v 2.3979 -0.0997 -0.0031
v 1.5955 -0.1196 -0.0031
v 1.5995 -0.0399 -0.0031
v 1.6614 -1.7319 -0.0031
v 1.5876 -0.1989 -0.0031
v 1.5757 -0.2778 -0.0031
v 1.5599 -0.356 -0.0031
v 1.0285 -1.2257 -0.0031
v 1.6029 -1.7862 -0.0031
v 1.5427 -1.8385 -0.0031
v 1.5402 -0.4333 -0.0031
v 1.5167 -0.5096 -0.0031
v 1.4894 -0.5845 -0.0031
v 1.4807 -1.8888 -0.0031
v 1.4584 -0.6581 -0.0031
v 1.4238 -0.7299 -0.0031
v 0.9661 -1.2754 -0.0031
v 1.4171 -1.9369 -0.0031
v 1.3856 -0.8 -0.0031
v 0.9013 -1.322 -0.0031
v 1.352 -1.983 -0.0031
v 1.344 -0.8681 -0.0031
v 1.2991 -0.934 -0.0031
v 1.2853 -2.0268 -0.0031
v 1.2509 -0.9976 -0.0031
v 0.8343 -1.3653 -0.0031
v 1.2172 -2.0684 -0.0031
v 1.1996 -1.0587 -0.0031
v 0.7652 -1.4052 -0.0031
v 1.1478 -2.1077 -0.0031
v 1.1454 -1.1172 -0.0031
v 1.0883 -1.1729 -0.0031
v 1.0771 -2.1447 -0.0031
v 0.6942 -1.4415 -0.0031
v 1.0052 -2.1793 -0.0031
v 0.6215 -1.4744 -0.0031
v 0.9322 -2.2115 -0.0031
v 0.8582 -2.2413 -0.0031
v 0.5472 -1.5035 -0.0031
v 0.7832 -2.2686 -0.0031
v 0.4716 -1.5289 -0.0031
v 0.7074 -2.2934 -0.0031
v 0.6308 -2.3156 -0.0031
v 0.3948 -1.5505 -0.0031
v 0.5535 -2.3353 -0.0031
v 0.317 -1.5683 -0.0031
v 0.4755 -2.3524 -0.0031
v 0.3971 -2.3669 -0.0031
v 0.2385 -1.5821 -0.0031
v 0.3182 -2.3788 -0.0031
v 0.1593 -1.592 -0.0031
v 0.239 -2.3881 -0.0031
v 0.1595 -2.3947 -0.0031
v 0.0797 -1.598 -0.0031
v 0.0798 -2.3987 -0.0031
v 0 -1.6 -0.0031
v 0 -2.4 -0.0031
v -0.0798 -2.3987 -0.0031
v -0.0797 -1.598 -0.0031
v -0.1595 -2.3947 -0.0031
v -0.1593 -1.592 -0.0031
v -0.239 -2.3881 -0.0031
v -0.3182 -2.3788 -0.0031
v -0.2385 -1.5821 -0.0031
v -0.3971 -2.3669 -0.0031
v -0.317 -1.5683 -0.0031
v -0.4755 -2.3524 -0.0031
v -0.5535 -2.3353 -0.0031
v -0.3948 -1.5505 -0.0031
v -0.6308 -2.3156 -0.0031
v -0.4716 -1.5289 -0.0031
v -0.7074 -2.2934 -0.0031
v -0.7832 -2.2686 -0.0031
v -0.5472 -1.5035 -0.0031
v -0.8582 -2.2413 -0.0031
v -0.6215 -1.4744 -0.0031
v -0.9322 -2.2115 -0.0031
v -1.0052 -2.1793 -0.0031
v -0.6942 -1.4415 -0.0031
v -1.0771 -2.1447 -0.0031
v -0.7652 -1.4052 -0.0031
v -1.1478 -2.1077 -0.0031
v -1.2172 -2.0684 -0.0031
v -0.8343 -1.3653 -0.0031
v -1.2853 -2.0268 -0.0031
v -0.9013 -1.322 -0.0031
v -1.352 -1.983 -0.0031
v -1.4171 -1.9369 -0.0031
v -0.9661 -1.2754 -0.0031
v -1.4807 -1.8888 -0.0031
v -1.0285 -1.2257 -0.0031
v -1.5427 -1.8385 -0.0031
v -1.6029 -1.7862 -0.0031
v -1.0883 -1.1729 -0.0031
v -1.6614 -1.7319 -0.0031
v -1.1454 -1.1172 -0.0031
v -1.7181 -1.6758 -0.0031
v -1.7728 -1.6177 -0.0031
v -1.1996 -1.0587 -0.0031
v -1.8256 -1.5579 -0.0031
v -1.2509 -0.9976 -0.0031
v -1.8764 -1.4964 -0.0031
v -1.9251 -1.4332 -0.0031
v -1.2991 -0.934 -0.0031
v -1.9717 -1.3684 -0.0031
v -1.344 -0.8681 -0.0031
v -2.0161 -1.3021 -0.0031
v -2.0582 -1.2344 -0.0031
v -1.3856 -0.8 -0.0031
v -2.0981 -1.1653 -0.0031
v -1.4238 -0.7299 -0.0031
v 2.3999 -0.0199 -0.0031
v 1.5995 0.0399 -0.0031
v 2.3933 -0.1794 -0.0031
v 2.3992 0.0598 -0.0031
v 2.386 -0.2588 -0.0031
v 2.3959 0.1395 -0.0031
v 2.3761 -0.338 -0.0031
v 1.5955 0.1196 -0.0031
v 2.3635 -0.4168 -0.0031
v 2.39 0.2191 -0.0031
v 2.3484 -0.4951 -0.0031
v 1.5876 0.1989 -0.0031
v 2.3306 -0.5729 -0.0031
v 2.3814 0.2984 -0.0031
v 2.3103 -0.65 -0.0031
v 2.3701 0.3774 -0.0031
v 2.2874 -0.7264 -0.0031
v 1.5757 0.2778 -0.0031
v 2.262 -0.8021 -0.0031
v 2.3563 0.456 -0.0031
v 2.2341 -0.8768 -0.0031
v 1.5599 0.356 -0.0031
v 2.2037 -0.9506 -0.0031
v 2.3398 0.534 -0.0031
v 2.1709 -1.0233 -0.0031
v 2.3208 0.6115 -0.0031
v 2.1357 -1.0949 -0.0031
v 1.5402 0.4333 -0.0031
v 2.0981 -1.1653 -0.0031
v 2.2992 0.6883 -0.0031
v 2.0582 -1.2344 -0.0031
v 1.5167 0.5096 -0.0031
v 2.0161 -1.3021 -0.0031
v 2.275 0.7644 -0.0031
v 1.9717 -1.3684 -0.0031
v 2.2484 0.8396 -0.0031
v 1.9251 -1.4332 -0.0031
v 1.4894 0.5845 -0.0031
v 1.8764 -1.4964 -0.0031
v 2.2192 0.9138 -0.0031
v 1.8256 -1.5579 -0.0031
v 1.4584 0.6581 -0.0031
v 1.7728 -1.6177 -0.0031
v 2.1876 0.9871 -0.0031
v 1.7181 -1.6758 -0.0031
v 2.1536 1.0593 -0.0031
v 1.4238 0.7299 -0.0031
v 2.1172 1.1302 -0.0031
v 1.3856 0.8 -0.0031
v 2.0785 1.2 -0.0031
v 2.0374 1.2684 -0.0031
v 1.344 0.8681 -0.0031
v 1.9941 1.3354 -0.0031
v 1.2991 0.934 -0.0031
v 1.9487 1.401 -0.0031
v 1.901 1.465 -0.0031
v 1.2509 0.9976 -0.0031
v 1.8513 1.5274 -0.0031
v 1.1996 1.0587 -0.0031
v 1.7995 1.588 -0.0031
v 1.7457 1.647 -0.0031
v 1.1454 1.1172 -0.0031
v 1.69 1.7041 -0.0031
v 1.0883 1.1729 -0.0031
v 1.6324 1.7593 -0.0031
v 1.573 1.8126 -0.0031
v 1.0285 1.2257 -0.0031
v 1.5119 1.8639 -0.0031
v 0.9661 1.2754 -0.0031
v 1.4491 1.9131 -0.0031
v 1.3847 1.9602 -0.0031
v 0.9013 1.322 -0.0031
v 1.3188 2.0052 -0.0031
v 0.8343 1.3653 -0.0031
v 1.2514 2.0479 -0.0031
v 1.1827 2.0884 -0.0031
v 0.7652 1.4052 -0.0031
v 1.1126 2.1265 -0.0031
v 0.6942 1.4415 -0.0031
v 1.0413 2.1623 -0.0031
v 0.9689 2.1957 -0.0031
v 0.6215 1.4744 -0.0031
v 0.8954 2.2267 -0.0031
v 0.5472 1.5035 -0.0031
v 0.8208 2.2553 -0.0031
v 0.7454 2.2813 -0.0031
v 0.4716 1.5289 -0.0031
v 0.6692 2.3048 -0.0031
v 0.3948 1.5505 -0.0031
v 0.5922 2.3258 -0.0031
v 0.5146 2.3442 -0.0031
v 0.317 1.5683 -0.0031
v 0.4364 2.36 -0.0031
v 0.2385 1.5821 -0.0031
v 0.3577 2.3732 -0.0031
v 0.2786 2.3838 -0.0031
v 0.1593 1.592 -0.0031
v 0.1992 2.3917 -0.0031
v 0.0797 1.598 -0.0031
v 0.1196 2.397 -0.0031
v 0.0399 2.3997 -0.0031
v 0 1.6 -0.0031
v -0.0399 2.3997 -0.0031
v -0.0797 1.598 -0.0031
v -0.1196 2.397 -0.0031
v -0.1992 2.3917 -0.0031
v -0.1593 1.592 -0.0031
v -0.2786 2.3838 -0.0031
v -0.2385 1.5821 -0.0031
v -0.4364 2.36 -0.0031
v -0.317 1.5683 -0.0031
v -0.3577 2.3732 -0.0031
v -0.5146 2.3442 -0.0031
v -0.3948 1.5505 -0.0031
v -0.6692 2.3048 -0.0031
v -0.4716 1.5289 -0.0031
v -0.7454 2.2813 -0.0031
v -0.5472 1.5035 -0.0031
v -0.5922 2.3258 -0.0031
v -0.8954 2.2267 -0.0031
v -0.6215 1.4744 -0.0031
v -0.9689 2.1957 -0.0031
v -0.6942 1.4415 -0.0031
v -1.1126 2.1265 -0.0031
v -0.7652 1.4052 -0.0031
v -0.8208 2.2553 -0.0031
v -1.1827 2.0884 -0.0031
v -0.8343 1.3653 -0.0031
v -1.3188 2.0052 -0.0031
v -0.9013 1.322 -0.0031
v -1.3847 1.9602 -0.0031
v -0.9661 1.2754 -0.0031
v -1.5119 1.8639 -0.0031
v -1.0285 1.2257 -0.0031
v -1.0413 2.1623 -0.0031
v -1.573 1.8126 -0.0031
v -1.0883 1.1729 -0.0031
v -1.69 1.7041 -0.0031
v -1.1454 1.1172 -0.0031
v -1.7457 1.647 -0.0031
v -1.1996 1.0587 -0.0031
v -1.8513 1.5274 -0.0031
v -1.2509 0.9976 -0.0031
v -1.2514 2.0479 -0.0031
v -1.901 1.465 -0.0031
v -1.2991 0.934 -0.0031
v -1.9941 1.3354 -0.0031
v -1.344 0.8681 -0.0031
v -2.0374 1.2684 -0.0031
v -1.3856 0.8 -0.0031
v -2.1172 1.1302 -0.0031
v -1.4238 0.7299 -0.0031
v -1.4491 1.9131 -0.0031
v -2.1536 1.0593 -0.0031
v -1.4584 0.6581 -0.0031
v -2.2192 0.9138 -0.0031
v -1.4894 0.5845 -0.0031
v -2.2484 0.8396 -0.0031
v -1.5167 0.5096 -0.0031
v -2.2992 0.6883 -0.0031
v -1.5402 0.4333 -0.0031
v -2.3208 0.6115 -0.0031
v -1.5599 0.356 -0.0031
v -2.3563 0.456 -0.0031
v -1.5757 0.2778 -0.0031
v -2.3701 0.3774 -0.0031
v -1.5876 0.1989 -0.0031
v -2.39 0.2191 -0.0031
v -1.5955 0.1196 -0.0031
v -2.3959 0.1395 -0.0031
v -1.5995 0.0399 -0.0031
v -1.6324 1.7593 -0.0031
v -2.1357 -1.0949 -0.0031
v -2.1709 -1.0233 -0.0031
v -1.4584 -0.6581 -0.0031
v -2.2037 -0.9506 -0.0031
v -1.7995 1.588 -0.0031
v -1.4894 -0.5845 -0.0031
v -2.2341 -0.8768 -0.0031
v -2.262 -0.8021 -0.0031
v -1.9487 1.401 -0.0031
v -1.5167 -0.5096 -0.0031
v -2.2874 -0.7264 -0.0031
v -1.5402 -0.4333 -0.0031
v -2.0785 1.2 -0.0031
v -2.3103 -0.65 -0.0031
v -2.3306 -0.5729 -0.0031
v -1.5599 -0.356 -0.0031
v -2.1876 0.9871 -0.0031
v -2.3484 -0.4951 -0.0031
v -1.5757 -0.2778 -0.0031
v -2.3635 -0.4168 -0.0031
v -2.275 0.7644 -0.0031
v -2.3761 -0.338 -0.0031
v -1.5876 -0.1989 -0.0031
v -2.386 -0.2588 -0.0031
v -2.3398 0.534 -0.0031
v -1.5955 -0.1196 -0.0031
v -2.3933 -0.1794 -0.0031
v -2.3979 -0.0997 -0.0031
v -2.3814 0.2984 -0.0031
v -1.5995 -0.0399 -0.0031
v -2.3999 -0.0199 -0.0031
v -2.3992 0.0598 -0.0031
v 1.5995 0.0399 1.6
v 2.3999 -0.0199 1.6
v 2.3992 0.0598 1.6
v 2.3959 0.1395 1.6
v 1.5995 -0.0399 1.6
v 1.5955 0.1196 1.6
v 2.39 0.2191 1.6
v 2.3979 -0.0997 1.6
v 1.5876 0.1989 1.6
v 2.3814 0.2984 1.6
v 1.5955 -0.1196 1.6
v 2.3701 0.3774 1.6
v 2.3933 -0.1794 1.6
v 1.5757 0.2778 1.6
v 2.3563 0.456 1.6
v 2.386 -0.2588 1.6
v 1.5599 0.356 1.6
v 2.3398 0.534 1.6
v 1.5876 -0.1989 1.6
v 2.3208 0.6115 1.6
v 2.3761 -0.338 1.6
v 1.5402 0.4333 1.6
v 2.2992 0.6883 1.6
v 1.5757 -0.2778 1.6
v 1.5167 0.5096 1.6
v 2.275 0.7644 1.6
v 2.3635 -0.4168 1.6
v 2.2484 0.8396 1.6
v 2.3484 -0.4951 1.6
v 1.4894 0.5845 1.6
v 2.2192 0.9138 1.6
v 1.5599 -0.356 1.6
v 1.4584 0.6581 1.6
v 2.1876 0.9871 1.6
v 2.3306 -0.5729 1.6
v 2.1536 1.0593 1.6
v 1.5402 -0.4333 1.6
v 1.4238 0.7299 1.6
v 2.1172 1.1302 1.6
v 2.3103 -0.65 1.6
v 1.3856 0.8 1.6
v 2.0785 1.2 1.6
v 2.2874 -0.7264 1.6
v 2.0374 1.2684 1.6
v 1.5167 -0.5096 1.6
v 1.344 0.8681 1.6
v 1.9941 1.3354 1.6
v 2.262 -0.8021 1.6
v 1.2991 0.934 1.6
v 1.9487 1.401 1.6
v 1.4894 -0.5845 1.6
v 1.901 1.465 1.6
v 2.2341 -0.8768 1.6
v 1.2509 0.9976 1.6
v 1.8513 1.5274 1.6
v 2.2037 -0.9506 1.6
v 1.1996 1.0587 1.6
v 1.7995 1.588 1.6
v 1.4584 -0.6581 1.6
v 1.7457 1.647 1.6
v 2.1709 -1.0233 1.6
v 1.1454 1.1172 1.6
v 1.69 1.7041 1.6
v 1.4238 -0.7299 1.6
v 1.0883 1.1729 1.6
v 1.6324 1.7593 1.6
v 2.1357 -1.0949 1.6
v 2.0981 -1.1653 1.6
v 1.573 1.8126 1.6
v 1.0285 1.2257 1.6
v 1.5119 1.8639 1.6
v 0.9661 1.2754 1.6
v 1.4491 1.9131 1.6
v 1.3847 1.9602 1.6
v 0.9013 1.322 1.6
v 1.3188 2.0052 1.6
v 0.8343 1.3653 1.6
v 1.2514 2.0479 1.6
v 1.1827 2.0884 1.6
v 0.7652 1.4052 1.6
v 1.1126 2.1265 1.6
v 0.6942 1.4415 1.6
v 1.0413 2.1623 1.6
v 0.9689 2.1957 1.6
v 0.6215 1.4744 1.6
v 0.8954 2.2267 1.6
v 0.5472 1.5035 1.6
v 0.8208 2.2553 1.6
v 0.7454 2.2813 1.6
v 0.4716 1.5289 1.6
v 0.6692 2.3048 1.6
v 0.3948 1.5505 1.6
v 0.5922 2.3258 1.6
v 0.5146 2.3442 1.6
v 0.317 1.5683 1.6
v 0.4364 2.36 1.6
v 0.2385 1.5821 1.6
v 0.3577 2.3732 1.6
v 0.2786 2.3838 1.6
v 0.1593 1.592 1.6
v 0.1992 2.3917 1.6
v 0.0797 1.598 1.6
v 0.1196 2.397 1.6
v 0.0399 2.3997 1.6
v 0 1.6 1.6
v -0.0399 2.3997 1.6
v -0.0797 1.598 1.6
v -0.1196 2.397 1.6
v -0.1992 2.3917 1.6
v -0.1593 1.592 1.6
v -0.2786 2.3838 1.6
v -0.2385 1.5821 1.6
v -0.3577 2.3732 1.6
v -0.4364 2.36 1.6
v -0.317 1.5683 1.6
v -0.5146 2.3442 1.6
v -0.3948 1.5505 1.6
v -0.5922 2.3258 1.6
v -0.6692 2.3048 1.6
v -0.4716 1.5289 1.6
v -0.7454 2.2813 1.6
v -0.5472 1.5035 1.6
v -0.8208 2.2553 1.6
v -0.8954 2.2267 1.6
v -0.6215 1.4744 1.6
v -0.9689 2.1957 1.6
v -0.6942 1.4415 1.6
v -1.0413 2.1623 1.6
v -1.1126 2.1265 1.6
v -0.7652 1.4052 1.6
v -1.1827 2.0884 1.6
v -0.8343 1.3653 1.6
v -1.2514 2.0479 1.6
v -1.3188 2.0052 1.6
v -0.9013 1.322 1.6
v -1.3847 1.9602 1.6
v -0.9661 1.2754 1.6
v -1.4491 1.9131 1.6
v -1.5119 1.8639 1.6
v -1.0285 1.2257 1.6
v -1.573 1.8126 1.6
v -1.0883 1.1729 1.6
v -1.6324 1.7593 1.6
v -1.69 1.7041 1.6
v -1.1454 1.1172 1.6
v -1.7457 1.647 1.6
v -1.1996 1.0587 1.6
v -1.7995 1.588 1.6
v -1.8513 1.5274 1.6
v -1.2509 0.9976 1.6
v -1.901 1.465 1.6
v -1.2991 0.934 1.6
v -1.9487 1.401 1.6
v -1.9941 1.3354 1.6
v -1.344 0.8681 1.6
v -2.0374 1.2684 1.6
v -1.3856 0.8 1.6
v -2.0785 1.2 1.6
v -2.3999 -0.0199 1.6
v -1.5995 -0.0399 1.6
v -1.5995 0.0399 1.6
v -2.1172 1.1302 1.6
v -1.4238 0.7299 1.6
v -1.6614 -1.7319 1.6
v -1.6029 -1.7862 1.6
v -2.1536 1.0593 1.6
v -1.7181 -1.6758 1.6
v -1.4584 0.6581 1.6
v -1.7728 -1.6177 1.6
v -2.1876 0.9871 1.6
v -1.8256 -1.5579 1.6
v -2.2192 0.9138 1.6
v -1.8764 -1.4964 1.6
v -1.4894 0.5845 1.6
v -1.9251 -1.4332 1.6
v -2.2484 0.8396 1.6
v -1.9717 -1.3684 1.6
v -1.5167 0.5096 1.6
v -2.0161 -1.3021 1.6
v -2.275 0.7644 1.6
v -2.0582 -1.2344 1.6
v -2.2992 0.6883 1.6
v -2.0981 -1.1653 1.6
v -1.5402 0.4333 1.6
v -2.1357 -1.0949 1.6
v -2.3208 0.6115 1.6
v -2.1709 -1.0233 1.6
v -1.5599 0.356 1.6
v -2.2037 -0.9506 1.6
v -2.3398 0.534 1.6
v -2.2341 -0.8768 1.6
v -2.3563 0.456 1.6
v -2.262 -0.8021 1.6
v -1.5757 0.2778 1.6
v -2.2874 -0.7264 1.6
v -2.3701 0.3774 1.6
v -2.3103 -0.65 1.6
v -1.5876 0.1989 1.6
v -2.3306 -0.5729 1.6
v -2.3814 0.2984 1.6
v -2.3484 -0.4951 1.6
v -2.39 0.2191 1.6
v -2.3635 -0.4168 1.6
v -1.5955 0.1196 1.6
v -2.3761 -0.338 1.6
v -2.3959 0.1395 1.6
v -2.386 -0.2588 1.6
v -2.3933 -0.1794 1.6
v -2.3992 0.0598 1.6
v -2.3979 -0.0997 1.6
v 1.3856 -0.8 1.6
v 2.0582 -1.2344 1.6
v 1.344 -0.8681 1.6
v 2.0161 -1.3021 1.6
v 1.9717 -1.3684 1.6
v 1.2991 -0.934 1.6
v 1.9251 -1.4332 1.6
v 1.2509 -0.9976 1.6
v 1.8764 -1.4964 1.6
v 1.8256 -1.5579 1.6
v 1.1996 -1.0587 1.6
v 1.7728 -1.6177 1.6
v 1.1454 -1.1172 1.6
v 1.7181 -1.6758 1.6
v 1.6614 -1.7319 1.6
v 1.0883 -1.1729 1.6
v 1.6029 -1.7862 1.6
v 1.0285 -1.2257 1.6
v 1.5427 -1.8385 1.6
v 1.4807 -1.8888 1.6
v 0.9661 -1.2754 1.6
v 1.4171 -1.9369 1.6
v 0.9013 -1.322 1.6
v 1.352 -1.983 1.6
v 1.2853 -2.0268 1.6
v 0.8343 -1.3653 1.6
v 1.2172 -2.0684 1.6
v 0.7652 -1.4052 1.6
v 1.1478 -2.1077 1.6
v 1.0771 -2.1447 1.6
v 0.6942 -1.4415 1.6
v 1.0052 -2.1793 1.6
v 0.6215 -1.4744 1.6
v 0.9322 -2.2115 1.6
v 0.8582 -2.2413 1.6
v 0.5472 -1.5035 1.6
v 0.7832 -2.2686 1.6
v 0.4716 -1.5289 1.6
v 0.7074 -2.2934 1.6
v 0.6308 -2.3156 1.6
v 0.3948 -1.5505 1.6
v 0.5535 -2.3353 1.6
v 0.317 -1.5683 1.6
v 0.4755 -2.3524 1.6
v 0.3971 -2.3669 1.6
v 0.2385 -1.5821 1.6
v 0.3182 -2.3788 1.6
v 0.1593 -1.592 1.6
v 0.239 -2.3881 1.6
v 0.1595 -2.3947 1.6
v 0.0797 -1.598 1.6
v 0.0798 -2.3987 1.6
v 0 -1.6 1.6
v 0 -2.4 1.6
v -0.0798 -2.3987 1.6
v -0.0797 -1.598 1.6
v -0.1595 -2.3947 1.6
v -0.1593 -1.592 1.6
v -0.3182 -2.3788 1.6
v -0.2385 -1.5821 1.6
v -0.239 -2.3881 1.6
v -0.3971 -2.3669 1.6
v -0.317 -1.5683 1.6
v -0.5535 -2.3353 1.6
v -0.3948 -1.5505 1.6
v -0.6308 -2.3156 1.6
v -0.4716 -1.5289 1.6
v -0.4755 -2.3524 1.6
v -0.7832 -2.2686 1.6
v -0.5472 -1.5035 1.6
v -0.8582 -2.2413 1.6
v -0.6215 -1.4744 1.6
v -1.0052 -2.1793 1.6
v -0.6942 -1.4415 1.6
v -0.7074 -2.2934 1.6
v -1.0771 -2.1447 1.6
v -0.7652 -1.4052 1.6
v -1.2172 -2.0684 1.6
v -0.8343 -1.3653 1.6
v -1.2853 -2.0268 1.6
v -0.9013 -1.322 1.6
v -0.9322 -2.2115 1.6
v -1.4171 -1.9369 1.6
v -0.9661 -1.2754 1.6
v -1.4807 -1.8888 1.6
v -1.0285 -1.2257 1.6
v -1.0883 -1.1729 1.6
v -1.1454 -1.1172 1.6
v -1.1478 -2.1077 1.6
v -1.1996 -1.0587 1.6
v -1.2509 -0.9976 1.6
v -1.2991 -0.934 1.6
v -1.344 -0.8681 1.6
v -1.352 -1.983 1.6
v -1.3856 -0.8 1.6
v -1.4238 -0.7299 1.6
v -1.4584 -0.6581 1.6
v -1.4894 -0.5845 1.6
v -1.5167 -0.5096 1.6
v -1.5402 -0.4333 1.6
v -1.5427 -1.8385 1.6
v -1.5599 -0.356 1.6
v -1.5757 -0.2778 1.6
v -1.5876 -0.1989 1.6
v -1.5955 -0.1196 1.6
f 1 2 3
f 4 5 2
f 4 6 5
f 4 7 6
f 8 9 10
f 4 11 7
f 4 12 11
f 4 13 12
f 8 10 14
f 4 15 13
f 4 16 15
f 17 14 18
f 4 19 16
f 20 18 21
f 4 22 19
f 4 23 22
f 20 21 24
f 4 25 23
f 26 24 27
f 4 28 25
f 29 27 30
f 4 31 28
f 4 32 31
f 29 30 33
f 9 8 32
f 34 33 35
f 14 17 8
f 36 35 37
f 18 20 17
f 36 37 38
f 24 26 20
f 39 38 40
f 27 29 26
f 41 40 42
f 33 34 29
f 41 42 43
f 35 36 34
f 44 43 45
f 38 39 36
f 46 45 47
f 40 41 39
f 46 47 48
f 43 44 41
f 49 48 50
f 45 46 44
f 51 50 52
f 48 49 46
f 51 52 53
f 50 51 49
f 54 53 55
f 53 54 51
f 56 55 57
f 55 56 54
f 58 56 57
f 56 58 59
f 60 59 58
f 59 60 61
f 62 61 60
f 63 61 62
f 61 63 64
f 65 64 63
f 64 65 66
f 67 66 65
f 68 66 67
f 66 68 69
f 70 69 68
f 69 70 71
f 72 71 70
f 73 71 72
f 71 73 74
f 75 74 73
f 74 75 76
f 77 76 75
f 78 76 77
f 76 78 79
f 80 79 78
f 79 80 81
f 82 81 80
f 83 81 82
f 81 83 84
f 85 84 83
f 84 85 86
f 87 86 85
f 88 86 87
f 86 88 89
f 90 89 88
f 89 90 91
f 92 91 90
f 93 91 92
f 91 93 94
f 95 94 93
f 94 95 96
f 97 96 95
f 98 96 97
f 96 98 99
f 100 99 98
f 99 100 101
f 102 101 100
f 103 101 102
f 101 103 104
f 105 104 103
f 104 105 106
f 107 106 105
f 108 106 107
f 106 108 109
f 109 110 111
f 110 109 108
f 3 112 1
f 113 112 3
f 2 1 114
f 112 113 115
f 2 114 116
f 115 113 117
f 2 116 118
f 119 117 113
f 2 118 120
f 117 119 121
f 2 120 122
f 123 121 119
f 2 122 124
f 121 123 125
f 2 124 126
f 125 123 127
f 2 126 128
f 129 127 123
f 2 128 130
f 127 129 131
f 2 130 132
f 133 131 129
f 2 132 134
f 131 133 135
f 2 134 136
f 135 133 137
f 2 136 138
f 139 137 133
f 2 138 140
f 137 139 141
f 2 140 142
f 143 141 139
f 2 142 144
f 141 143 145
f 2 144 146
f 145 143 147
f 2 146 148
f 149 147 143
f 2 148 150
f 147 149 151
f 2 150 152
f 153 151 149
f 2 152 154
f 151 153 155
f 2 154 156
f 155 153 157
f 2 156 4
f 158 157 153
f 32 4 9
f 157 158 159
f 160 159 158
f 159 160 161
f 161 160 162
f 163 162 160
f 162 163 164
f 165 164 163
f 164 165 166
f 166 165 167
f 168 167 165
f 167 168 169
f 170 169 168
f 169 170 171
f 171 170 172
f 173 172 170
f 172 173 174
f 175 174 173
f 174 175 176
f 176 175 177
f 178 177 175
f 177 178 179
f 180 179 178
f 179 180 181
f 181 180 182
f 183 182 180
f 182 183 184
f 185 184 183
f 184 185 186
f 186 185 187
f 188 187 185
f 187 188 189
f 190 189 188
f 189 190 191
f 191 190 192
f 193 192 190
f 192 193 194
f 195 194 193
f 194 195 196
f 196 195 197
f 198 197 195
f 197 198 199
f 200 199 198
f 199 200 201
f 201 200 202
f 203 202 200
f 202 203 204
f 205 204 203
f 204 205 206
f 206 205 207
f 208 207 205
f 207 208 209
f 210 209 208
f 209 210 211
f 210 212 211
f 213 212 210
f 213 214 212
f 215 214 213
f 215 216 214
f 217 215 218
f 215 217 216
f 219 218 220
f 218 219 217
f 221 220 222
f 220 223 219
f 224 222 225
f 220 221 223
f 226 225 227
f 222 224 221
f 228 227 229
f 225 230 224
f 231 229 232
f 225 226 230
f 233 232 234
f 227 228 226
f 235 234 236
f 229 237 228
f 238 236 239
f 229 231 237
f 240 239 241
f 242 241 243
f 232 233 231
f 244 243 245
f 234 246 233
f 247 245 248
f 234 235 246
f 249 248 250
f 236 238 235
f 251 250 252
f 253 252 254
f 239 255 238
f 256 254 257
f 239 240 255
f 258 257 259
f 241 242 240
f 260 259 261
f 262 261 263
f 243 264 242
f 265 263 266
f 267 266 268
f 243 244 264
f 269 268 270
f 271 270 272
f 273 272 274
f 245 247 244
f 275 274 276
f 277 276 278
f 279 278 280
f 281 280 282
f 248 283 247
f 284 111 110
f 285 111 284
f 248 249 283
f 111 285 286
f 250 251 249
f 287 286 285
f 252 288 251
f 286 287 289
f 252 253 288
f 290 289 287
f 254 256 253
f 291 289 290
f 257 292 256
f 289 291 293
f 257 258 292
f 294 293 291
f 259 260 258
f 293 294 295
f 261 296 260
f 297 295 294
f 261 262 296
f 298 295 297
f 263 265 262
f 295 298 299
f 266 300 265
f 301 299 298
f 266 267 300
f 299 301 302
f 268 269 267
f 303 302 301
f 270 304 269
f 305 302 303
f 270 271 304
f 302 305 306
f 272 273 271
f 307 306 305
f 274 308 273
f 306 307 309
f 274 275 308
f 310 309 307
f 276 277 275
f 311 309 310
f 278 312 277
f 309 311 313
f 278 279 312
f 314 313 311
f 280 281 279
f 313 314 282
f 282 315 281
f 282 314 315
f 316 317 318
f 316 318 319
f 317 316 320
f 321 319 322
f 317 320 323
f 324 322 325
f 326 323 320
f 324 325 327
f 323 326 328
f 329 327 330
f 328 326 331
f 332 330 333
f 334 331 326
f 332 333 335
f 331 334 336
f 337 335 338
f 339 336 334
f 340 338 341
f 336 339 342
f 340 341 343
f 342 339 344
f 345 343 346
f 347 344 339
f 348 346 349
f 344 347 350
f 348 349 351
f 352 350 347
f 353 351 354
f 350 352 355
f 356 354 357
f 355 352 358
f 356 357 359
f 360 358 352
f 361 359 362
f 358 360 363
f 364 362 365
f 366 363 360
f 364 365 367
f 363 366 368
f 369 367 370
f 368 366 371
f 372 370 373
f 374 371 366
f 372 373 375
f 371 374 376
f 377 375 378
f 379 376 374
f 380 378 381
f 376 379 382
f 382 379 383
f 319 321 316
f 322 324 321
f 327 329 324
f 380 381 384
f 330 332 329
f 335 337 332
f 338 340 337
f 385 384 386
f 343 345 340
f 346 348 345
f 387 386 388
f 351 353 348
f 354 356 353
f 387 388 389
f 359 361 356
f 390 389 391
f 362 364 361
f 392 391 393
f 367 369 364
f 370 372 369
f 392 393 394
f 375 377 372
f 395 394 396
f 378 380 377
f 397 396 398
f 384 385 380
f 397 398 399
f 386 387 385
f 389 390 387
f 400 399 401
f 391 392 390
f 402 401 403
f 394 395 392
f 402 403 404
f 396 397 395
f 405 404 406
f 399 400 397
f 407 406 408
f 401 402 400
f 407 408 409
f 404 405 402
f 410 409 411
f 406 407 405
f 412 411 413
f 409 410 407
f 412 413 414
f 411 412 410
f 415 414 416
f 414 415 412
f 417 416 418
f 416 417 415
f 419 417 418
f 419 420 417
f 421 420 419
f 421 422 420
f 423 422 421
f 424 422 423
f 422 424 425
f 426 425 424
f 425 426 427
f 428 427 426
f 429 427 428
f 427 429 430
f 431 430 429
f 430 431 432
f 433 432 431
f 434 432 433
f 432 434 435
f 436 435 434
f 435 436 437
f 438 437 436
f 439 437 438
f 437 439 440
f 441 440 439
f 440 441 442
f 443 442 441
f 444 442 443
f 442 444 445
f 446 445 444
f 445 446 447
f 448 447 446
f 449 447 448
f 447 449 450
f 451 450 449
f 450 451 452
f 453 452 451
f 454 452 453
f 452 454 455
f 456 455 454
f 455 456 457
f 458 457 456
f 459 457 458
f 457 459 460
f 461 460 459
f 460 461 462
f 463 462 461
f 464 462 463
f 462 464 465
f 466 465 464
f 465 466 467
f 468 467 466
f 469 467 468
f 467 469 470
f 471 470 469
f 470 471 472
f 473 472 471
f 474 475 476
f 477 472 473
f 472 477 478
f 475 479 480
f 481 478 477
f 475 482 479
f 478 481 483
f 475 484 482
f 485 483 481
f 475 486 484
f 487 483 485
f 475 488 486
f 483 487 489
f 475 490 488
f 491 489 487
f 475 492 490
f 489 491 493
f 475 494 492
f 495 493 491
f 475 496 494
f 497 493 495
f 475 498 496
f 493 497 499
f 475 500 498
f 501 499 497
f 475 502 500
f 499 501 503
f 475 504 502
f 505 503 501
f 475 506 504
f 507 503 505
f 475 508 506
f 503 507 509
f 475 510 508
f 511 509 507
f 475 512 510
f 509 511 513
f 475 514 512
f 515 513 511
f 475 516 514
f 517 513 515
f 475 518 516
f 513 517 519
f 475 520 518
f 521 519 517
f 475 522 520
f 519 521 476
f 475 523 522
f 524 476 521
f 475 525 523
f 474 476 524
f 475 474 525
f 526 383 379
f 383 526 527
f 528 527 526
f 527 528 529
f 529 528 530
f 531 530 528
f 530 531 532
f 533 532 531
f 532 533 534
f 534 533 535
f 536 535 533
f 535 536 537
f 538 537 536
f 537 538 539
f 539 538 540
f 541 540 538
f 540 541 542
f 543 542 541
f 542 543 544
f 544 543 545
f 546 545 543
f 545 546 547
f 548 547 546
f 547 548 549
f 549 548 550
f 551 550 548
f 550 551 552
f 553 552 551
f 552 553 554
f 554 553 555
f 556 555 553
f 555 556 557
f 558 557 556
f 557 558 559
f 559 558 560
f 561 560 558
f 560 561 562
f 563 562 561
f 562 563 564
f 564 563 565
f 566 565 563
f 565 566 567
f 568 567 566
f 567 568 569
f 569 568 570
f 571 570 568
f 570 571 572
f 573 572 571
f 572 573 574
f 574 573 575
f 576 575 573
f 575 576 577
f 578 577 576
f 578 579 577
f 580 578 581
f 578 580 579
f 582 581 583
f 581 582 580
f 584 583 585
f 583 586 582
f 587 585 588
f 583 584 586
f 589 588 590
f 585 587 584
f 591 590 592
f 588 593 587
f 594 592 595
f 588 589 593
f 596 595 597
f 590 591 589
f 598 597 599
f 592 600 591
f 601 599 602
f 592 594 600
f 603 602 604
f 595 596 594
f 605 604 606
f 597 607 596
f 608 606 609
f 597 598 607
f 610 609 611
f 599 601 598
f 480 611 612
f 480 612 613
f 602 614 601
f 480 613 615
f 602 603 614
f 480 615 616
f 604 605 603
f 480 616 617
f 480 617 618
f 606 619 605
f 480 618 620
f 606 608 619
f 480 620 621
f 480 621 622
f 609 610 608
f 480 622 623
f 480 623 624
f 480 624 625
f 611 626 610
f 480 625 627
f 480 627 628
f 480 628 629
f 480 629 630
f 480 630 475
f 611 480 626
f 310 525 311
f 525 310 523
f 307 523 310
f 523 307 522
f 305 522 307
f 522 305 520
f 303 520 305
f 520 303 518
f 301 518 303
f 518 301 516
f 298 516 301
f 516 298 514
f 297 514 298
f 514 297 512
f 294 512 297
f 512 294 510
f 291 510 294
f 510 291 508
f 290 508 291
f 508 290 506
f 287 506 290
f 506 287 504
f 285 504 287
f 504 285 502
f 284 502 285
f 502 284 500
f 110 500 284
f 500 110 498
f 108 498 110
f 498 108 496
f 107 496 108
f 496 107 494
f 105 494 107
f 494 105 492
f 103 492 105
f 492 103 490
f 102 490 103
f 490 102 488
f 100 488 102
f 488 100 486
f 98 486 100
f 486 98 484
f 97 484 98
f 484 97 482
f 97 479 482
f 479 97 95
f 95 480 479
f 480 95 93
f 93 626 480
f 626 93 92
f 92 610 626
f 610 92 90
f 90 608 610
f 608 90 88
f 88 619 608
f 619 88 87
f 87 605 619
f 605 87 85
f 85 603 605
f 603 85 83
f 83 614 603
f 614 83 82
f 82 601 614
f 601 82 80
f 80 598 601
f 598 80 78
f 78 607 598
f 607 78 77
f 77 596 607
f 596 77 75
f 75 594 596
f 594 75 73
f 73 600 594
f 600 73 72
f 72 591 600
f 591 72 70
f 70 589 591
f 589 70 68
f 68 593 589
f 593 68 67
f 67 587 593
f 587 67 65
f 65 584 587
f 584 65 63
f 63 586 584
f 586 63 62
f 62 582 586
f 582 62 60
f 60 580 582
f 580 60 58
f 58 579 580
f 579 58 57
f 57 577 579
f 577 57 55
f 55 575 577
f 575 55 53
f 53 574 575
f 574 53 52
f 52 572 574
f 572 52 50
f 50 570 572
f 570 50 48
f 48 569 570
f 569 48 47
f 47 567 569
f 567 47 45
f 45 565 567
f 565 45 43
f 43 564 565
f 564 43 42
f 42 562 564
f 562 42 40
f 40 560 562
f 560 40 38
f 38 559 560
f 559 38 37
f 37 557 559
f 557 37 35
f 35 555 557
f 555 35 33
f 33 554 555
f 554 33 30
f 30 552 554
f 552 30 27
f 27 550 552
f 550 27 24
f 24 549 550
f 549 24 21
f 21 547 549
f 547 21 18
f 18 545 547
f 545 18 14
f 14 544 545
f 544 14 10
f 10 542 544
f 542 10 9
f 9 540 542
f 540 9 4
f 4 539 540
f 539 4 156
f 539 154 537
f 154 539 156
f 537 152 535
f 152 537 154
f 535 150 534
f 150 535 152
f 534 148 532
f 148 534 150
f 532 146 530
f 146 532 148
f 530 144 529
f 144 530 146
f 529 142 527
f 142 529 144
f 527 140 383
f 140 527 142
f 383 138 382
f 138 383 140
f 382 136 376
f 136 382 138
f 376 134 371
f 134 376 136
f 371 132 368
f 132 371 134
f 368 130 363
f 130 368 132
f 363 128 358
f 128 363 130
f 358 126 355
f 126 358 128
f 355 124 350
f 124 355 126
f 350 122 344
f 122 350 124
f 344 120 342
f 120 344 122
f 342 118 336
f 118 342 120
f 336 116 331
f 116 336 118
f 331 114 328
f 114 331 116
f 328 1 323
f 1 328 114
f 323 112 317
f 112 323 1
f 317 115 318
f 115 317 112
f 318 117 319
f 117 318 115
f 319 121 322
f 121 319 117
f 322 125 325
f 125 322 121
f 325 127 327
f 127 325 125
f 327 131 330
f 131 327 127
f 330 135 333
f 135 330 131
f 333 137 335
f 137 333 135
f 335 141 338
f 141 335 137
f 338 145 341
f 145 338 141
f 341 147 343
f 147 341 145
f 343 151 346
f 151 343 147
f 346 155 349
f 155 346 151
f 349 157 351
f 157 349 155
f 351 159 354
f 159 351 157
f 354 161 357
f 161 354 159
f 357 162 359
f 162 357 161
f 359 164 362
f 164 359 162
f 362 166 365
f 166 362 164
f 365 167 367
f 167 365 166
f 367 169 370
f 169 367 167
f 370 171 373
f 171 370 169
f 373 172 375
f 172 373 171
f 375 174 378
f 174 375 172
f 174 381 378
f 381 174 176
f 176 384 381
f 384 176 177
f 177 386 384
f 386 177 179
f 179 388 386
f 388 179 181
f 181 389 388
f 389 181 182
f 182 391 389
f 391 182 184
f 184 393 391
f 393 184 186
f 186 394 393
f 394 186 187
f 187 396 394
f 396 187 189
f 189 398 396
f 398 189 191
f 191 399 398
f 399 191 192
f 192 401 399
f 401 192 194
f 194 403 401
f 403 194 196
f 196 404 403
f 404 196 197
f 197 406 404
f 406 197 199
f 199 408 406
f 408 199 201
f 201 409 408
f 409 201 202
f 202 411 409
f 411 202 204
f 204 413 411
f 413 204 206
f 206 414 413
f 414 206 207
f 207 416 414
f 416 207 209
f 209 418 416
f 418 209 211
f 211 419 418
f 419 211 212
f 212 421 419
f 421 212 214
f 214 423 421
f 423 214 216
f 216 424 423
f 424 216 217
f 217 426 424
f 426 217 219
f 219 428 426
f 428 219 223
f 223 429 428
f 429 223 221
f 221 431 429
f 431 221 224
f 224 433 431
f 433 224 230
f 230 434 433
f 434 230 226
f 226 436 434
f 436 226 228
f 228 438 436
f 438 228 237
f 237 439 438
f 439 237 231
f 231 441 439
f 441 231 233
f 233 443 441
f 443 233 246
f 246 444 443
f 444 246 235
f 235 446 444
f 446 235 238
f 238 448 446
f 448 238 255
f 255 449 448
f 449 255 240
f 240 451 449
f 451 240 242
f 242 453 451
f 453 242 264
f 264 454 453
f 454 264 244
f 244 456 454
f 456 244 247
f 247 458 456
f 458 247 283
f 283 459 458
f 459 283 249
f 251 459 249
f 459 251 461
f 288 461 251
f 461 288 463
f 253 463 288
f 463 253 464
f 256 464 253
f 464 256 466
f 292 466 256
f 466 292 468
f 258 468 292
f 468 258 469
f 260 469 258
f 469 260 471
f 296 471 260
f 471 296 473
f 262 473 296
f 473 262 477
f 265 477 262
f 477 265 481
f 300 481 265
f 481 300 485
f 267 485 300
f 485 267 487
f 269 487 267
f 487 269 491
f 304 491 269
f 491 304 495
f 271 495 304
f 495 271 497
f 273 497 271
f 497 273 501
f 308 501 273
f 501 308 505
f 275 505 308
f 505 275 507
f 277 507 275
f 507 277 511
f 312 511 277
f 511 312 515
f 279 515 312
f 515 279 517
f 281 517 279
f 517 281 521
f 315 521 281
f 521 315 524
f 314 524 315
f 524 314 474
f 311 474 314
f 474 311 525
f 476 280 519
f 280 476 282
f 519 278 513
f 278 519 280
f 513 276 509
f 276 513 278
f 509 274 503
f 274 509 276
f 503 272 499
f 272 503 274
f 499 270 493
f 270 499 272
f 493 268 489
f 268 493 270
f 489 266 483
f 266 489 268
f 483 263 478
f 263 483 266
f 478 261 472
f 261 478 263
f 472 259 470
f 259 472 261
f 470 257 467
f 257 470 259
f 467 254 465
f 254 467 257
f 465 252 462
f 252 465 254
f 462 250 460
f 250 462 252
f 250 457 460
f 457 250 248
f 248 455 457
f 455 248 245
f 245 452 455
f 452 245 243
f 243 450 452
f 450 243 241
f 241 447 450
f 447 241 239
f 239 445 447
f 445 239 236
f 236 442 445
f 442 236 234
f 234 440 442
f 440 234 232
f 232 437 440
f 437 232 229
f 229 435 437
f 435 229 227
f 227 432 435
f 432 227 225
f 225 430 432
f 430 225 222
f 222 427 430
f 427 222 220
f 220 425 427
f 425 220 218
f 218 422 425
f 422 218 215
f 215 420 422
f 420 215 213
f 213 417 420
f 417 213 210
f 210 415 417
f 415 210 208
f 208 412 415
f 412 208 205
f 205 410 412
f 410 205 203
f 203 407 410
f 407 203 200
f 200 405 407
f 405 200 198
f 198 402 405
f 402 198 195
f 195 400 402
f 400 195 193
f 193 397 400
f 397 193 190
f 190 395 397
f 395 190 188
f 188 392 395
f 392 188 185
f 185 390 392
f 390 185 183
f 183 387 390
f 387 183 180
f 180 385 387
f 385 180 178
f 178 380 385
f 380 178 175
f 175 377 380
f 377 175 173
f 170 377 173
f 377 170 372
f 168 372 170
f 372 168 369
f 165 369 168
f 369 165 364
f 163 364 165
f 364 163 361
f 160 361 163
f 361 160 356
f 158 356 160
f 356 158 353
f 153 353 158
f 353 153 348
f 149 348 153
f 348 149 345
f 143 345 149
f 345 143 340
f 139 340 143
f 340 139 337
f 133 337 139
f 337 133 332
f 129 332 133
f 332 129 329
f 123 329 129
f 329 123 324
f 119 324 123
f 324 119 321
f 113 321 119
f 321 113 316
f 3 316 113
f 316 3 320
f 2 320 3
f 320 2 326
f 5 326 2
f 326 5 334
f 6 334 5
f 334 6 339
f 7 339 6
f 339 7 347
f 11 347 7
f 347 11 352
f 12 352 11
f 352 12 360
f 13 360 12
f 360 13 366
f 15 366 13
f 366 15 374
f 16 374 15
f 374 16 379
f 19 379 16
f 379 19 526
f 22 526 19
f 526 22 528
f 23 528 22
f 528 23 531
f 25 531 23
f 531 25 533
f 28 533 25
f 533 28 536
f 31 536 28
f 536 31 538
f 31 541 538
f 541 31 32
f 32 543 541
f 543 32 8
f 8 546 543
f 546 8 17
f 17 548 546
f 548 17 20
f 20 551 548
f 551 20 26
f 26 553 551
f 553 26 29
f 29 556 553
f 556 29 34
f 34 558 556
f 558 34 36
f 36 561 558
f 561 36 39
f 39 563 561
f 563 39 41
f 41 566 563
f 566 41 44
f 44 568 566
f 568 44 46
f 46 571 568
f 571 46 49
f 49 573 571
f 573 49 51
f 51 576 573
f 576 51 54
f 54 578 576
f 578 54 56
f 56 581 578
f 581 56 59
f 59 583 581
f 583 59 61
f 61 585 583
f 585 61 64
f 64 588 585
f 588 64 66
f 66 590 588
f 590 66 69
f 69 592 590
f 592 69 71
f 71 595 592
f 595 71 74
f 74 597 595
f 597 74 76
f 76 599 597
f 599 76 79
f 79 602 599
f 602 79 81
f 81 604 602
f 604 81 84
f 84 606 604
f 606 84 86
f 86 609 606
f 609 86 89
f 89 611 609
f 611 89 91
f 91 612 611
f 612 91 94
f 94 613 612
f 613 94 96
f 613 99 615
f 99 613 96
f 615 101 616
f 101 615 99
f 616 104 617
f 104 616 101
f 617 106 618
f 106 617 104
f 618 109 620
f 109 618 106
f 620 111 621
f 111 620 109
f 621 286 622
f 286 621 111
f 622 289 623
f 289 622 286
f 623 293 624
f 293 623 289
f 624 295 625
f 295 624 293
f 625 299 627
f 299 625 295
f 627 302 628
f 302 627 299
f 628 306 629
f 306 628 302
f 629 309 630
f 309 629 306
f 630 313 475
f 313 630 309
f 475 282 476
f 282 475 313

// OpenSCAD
use <../../lib.scad>
use <../../p/recte3.scad>
use <3755as01.scad>
use <../../p/tri3a4.scad>
$fa=1; $fs=0.2;
function ldraw_lib__s__3755bs01(realsolid=false) = [
// 0 ~Brick  1 x  3 x  5 with Inner Ridges without Front Face
// 0 Name: s\3755bs01.dat
// 0 Author: Magnus Forsberg [MagFors]
// 0 !LDRAW_ORG Subpart UPDATE 2020-03
// 0 !LICENSE Licensed under CC BY 2.0 and CC BY 4.0 : see CAreadme.txt
// 
// 0 BFC CERTIFY CCW
  [0,"BFC","CERTIFY"],
  [0,"BFC","CCW"],
// 
// 0 !HISTORY 2020-12-29 [PTadmin] Official Update 2020-03
// 
// 
// 1 16 0 0 0 1 0 0 0 1 0 0 0 1 s\3755as01.dat
  [1,16,0,0,0,1,0,0,0,1,0,0,0,1, ldraw_lib__s__3755as01(realsolid)],
// 1 16 -6 4 -3.75 0 0 2.5 0 115.5 0 -2.25 0 -2.25 tri3a4.dat
  [1,16,-6,4,-3.75,0,0,2.5,0,115.5,0,-2.25,0,-2.25, ldraw_lib__tri3a4(realsolid)],
// 1 16 -14 4 -3.75 0 0 -2.5 0 115.5 0 -2.25 0 -2.25 tri3a4.dat
  [1,16,-14,4,-3.75,0,0,-2.5,0,115.5,0,-2.25,0,-2.25, ldraw_lib__tri3a4(realsolid)],
// 1 16 -6 4 3.75 0 0 2.5 0 115.5 0 2.25 0 2.25 tri3a4.dat
  [1,16,-6,4,3.75,0,0,2.5,0,115.5,0,2.25,0,2.25, ldraw_lib__tri3a4(realsolid)],
// 1 16 -14 4 3.75 0 0 -2.5 0 115.5 0 2.25 0 2.25 tri3a4.dat
  [1,16,-14,4,3.75,0,0,-2.5,0,115.5,0,2.25,0,2.25, ldraw_lib__tri3a4(realsolid)],
// 1 16 14 4 -3.75 0 0 2.5 0 115.5 0 -2.25 0 -2.25 tri3a4.dat
  [1,16,14,4,-3.75,0,0,2.5,0,115.5,0,-2.25,0,-2.25, ldraw_lib__tri3a4(realsolid)],
// 1 16 6 4 -3.75 0 0 -2.5 0 115.5 0 -2.25 0 -2.25 tri3a4.dat
  [1,16,6,4,-3.75,0,0,-2.5,0,115.5,0,-2.25,0,-2.25, ldraw_lib__tri3a4(realsolid)],
// 1 16 14 4 3.75 0 0 2.5 0 115.5 0 2.25 0 2.25 tri3a4.dat
  [1,16,14,4,3.75,0,0,2.5,0,115.5,0,2.25,0,2.25, ldraw_lib__tri3a4(realsolid)],
// 1 16 6 4 3.75 0 0 -2.5 0 115.5 0 2.25 0 2.25 tri3a4.dat
  [1,16,6,4,3.75,0,0,-2.5,0,115.5,0,2.25,0,2.25, ldraw_lib__tri3a4(realsolid)],
// 1 16 -4.75 61.75 -6 -1.25 0 0 0 0 57.75 0 1 0 recte3.dat
  [1,16,-4.75,61.75,-6,-1.25,0,0,0,0,57.75,0,1,0, ldraw_lib__recte3(realsolid)],
// 1 16 -15.25 61.75 -6 -1.25 0 0 0 0 57.75 0 1 0 recte3.dat
  [1,16,-15.25,61.75,-6,-1.25,0,0,0,0,57.75,0,1,0, ldraw_lib__recte3(realsolid)],
// 1 16 -4.75 61.75 6 -1.25 0 0 0 0 57.75 0 1 0 recte3.dat
  [1,16,-4.75,61.75,6,-1.25,0,0,0,0,57.75,0,1,0, ldraw_lib__recte3(realsolid)],
// 1 16 -15.25 61.75 6 -1.25 0 0 0 0 57.75 0 1 0 recte3.dat
  [1,16,-15.25,61.75,6,-1.25,0,0,0,0,57.75,0,1,0, ldraw_lib__recte3(realsolid)],
// 1 16 4.75 61.75 -6 -1.25 0 0 0 0 57.75 0 1 0 recte3.dat
  [1,16,4.75,61.75,-6,-1.25,0,0,0,0,57.75,0,1,0, ldraw_lib__recte3(realsolid)],
// 1 16 15.25 61.75 -6 -1.25 0 0 0 0 57.75 0 1 0 recte3.dat
  [1,16,15.25,61.75,-6,-1.25,0,0,0,0,57.75,0,1,0, ldraw_lib__recte3(realsolid)],
// 1 16 4.75 61.75 6 -1.25 0 0 0 0 57.75 0 1 0 recte3.dat
  [1,16,4.75,61.75,6,-1.25,0,0,0,0,57.75,0,1,0, ldraw_lib__recte3(realsolid)],
// 1 16 15.25 61.75 6 -1.25 0 0 0 0 57.75 0 1 0 recte3.dat
  [1,16,15.25,61.75,6,-1.25,0,0,0,0,57.75,0,1,0, ldraw_lib__recte3(realsolid)],
];
module ldraw_lib__s__3755bs01(step=0, col=false, unit=2/5, alt=false, line=0.2, solid=!$preview)
    makepoly(ldraw_lib__s__3755bs01(solid), step=step, col=col, unit=unit, alt=alt, line=line, solid=solid);
ldraw_lib__s__3755bs01(line=0.2);
